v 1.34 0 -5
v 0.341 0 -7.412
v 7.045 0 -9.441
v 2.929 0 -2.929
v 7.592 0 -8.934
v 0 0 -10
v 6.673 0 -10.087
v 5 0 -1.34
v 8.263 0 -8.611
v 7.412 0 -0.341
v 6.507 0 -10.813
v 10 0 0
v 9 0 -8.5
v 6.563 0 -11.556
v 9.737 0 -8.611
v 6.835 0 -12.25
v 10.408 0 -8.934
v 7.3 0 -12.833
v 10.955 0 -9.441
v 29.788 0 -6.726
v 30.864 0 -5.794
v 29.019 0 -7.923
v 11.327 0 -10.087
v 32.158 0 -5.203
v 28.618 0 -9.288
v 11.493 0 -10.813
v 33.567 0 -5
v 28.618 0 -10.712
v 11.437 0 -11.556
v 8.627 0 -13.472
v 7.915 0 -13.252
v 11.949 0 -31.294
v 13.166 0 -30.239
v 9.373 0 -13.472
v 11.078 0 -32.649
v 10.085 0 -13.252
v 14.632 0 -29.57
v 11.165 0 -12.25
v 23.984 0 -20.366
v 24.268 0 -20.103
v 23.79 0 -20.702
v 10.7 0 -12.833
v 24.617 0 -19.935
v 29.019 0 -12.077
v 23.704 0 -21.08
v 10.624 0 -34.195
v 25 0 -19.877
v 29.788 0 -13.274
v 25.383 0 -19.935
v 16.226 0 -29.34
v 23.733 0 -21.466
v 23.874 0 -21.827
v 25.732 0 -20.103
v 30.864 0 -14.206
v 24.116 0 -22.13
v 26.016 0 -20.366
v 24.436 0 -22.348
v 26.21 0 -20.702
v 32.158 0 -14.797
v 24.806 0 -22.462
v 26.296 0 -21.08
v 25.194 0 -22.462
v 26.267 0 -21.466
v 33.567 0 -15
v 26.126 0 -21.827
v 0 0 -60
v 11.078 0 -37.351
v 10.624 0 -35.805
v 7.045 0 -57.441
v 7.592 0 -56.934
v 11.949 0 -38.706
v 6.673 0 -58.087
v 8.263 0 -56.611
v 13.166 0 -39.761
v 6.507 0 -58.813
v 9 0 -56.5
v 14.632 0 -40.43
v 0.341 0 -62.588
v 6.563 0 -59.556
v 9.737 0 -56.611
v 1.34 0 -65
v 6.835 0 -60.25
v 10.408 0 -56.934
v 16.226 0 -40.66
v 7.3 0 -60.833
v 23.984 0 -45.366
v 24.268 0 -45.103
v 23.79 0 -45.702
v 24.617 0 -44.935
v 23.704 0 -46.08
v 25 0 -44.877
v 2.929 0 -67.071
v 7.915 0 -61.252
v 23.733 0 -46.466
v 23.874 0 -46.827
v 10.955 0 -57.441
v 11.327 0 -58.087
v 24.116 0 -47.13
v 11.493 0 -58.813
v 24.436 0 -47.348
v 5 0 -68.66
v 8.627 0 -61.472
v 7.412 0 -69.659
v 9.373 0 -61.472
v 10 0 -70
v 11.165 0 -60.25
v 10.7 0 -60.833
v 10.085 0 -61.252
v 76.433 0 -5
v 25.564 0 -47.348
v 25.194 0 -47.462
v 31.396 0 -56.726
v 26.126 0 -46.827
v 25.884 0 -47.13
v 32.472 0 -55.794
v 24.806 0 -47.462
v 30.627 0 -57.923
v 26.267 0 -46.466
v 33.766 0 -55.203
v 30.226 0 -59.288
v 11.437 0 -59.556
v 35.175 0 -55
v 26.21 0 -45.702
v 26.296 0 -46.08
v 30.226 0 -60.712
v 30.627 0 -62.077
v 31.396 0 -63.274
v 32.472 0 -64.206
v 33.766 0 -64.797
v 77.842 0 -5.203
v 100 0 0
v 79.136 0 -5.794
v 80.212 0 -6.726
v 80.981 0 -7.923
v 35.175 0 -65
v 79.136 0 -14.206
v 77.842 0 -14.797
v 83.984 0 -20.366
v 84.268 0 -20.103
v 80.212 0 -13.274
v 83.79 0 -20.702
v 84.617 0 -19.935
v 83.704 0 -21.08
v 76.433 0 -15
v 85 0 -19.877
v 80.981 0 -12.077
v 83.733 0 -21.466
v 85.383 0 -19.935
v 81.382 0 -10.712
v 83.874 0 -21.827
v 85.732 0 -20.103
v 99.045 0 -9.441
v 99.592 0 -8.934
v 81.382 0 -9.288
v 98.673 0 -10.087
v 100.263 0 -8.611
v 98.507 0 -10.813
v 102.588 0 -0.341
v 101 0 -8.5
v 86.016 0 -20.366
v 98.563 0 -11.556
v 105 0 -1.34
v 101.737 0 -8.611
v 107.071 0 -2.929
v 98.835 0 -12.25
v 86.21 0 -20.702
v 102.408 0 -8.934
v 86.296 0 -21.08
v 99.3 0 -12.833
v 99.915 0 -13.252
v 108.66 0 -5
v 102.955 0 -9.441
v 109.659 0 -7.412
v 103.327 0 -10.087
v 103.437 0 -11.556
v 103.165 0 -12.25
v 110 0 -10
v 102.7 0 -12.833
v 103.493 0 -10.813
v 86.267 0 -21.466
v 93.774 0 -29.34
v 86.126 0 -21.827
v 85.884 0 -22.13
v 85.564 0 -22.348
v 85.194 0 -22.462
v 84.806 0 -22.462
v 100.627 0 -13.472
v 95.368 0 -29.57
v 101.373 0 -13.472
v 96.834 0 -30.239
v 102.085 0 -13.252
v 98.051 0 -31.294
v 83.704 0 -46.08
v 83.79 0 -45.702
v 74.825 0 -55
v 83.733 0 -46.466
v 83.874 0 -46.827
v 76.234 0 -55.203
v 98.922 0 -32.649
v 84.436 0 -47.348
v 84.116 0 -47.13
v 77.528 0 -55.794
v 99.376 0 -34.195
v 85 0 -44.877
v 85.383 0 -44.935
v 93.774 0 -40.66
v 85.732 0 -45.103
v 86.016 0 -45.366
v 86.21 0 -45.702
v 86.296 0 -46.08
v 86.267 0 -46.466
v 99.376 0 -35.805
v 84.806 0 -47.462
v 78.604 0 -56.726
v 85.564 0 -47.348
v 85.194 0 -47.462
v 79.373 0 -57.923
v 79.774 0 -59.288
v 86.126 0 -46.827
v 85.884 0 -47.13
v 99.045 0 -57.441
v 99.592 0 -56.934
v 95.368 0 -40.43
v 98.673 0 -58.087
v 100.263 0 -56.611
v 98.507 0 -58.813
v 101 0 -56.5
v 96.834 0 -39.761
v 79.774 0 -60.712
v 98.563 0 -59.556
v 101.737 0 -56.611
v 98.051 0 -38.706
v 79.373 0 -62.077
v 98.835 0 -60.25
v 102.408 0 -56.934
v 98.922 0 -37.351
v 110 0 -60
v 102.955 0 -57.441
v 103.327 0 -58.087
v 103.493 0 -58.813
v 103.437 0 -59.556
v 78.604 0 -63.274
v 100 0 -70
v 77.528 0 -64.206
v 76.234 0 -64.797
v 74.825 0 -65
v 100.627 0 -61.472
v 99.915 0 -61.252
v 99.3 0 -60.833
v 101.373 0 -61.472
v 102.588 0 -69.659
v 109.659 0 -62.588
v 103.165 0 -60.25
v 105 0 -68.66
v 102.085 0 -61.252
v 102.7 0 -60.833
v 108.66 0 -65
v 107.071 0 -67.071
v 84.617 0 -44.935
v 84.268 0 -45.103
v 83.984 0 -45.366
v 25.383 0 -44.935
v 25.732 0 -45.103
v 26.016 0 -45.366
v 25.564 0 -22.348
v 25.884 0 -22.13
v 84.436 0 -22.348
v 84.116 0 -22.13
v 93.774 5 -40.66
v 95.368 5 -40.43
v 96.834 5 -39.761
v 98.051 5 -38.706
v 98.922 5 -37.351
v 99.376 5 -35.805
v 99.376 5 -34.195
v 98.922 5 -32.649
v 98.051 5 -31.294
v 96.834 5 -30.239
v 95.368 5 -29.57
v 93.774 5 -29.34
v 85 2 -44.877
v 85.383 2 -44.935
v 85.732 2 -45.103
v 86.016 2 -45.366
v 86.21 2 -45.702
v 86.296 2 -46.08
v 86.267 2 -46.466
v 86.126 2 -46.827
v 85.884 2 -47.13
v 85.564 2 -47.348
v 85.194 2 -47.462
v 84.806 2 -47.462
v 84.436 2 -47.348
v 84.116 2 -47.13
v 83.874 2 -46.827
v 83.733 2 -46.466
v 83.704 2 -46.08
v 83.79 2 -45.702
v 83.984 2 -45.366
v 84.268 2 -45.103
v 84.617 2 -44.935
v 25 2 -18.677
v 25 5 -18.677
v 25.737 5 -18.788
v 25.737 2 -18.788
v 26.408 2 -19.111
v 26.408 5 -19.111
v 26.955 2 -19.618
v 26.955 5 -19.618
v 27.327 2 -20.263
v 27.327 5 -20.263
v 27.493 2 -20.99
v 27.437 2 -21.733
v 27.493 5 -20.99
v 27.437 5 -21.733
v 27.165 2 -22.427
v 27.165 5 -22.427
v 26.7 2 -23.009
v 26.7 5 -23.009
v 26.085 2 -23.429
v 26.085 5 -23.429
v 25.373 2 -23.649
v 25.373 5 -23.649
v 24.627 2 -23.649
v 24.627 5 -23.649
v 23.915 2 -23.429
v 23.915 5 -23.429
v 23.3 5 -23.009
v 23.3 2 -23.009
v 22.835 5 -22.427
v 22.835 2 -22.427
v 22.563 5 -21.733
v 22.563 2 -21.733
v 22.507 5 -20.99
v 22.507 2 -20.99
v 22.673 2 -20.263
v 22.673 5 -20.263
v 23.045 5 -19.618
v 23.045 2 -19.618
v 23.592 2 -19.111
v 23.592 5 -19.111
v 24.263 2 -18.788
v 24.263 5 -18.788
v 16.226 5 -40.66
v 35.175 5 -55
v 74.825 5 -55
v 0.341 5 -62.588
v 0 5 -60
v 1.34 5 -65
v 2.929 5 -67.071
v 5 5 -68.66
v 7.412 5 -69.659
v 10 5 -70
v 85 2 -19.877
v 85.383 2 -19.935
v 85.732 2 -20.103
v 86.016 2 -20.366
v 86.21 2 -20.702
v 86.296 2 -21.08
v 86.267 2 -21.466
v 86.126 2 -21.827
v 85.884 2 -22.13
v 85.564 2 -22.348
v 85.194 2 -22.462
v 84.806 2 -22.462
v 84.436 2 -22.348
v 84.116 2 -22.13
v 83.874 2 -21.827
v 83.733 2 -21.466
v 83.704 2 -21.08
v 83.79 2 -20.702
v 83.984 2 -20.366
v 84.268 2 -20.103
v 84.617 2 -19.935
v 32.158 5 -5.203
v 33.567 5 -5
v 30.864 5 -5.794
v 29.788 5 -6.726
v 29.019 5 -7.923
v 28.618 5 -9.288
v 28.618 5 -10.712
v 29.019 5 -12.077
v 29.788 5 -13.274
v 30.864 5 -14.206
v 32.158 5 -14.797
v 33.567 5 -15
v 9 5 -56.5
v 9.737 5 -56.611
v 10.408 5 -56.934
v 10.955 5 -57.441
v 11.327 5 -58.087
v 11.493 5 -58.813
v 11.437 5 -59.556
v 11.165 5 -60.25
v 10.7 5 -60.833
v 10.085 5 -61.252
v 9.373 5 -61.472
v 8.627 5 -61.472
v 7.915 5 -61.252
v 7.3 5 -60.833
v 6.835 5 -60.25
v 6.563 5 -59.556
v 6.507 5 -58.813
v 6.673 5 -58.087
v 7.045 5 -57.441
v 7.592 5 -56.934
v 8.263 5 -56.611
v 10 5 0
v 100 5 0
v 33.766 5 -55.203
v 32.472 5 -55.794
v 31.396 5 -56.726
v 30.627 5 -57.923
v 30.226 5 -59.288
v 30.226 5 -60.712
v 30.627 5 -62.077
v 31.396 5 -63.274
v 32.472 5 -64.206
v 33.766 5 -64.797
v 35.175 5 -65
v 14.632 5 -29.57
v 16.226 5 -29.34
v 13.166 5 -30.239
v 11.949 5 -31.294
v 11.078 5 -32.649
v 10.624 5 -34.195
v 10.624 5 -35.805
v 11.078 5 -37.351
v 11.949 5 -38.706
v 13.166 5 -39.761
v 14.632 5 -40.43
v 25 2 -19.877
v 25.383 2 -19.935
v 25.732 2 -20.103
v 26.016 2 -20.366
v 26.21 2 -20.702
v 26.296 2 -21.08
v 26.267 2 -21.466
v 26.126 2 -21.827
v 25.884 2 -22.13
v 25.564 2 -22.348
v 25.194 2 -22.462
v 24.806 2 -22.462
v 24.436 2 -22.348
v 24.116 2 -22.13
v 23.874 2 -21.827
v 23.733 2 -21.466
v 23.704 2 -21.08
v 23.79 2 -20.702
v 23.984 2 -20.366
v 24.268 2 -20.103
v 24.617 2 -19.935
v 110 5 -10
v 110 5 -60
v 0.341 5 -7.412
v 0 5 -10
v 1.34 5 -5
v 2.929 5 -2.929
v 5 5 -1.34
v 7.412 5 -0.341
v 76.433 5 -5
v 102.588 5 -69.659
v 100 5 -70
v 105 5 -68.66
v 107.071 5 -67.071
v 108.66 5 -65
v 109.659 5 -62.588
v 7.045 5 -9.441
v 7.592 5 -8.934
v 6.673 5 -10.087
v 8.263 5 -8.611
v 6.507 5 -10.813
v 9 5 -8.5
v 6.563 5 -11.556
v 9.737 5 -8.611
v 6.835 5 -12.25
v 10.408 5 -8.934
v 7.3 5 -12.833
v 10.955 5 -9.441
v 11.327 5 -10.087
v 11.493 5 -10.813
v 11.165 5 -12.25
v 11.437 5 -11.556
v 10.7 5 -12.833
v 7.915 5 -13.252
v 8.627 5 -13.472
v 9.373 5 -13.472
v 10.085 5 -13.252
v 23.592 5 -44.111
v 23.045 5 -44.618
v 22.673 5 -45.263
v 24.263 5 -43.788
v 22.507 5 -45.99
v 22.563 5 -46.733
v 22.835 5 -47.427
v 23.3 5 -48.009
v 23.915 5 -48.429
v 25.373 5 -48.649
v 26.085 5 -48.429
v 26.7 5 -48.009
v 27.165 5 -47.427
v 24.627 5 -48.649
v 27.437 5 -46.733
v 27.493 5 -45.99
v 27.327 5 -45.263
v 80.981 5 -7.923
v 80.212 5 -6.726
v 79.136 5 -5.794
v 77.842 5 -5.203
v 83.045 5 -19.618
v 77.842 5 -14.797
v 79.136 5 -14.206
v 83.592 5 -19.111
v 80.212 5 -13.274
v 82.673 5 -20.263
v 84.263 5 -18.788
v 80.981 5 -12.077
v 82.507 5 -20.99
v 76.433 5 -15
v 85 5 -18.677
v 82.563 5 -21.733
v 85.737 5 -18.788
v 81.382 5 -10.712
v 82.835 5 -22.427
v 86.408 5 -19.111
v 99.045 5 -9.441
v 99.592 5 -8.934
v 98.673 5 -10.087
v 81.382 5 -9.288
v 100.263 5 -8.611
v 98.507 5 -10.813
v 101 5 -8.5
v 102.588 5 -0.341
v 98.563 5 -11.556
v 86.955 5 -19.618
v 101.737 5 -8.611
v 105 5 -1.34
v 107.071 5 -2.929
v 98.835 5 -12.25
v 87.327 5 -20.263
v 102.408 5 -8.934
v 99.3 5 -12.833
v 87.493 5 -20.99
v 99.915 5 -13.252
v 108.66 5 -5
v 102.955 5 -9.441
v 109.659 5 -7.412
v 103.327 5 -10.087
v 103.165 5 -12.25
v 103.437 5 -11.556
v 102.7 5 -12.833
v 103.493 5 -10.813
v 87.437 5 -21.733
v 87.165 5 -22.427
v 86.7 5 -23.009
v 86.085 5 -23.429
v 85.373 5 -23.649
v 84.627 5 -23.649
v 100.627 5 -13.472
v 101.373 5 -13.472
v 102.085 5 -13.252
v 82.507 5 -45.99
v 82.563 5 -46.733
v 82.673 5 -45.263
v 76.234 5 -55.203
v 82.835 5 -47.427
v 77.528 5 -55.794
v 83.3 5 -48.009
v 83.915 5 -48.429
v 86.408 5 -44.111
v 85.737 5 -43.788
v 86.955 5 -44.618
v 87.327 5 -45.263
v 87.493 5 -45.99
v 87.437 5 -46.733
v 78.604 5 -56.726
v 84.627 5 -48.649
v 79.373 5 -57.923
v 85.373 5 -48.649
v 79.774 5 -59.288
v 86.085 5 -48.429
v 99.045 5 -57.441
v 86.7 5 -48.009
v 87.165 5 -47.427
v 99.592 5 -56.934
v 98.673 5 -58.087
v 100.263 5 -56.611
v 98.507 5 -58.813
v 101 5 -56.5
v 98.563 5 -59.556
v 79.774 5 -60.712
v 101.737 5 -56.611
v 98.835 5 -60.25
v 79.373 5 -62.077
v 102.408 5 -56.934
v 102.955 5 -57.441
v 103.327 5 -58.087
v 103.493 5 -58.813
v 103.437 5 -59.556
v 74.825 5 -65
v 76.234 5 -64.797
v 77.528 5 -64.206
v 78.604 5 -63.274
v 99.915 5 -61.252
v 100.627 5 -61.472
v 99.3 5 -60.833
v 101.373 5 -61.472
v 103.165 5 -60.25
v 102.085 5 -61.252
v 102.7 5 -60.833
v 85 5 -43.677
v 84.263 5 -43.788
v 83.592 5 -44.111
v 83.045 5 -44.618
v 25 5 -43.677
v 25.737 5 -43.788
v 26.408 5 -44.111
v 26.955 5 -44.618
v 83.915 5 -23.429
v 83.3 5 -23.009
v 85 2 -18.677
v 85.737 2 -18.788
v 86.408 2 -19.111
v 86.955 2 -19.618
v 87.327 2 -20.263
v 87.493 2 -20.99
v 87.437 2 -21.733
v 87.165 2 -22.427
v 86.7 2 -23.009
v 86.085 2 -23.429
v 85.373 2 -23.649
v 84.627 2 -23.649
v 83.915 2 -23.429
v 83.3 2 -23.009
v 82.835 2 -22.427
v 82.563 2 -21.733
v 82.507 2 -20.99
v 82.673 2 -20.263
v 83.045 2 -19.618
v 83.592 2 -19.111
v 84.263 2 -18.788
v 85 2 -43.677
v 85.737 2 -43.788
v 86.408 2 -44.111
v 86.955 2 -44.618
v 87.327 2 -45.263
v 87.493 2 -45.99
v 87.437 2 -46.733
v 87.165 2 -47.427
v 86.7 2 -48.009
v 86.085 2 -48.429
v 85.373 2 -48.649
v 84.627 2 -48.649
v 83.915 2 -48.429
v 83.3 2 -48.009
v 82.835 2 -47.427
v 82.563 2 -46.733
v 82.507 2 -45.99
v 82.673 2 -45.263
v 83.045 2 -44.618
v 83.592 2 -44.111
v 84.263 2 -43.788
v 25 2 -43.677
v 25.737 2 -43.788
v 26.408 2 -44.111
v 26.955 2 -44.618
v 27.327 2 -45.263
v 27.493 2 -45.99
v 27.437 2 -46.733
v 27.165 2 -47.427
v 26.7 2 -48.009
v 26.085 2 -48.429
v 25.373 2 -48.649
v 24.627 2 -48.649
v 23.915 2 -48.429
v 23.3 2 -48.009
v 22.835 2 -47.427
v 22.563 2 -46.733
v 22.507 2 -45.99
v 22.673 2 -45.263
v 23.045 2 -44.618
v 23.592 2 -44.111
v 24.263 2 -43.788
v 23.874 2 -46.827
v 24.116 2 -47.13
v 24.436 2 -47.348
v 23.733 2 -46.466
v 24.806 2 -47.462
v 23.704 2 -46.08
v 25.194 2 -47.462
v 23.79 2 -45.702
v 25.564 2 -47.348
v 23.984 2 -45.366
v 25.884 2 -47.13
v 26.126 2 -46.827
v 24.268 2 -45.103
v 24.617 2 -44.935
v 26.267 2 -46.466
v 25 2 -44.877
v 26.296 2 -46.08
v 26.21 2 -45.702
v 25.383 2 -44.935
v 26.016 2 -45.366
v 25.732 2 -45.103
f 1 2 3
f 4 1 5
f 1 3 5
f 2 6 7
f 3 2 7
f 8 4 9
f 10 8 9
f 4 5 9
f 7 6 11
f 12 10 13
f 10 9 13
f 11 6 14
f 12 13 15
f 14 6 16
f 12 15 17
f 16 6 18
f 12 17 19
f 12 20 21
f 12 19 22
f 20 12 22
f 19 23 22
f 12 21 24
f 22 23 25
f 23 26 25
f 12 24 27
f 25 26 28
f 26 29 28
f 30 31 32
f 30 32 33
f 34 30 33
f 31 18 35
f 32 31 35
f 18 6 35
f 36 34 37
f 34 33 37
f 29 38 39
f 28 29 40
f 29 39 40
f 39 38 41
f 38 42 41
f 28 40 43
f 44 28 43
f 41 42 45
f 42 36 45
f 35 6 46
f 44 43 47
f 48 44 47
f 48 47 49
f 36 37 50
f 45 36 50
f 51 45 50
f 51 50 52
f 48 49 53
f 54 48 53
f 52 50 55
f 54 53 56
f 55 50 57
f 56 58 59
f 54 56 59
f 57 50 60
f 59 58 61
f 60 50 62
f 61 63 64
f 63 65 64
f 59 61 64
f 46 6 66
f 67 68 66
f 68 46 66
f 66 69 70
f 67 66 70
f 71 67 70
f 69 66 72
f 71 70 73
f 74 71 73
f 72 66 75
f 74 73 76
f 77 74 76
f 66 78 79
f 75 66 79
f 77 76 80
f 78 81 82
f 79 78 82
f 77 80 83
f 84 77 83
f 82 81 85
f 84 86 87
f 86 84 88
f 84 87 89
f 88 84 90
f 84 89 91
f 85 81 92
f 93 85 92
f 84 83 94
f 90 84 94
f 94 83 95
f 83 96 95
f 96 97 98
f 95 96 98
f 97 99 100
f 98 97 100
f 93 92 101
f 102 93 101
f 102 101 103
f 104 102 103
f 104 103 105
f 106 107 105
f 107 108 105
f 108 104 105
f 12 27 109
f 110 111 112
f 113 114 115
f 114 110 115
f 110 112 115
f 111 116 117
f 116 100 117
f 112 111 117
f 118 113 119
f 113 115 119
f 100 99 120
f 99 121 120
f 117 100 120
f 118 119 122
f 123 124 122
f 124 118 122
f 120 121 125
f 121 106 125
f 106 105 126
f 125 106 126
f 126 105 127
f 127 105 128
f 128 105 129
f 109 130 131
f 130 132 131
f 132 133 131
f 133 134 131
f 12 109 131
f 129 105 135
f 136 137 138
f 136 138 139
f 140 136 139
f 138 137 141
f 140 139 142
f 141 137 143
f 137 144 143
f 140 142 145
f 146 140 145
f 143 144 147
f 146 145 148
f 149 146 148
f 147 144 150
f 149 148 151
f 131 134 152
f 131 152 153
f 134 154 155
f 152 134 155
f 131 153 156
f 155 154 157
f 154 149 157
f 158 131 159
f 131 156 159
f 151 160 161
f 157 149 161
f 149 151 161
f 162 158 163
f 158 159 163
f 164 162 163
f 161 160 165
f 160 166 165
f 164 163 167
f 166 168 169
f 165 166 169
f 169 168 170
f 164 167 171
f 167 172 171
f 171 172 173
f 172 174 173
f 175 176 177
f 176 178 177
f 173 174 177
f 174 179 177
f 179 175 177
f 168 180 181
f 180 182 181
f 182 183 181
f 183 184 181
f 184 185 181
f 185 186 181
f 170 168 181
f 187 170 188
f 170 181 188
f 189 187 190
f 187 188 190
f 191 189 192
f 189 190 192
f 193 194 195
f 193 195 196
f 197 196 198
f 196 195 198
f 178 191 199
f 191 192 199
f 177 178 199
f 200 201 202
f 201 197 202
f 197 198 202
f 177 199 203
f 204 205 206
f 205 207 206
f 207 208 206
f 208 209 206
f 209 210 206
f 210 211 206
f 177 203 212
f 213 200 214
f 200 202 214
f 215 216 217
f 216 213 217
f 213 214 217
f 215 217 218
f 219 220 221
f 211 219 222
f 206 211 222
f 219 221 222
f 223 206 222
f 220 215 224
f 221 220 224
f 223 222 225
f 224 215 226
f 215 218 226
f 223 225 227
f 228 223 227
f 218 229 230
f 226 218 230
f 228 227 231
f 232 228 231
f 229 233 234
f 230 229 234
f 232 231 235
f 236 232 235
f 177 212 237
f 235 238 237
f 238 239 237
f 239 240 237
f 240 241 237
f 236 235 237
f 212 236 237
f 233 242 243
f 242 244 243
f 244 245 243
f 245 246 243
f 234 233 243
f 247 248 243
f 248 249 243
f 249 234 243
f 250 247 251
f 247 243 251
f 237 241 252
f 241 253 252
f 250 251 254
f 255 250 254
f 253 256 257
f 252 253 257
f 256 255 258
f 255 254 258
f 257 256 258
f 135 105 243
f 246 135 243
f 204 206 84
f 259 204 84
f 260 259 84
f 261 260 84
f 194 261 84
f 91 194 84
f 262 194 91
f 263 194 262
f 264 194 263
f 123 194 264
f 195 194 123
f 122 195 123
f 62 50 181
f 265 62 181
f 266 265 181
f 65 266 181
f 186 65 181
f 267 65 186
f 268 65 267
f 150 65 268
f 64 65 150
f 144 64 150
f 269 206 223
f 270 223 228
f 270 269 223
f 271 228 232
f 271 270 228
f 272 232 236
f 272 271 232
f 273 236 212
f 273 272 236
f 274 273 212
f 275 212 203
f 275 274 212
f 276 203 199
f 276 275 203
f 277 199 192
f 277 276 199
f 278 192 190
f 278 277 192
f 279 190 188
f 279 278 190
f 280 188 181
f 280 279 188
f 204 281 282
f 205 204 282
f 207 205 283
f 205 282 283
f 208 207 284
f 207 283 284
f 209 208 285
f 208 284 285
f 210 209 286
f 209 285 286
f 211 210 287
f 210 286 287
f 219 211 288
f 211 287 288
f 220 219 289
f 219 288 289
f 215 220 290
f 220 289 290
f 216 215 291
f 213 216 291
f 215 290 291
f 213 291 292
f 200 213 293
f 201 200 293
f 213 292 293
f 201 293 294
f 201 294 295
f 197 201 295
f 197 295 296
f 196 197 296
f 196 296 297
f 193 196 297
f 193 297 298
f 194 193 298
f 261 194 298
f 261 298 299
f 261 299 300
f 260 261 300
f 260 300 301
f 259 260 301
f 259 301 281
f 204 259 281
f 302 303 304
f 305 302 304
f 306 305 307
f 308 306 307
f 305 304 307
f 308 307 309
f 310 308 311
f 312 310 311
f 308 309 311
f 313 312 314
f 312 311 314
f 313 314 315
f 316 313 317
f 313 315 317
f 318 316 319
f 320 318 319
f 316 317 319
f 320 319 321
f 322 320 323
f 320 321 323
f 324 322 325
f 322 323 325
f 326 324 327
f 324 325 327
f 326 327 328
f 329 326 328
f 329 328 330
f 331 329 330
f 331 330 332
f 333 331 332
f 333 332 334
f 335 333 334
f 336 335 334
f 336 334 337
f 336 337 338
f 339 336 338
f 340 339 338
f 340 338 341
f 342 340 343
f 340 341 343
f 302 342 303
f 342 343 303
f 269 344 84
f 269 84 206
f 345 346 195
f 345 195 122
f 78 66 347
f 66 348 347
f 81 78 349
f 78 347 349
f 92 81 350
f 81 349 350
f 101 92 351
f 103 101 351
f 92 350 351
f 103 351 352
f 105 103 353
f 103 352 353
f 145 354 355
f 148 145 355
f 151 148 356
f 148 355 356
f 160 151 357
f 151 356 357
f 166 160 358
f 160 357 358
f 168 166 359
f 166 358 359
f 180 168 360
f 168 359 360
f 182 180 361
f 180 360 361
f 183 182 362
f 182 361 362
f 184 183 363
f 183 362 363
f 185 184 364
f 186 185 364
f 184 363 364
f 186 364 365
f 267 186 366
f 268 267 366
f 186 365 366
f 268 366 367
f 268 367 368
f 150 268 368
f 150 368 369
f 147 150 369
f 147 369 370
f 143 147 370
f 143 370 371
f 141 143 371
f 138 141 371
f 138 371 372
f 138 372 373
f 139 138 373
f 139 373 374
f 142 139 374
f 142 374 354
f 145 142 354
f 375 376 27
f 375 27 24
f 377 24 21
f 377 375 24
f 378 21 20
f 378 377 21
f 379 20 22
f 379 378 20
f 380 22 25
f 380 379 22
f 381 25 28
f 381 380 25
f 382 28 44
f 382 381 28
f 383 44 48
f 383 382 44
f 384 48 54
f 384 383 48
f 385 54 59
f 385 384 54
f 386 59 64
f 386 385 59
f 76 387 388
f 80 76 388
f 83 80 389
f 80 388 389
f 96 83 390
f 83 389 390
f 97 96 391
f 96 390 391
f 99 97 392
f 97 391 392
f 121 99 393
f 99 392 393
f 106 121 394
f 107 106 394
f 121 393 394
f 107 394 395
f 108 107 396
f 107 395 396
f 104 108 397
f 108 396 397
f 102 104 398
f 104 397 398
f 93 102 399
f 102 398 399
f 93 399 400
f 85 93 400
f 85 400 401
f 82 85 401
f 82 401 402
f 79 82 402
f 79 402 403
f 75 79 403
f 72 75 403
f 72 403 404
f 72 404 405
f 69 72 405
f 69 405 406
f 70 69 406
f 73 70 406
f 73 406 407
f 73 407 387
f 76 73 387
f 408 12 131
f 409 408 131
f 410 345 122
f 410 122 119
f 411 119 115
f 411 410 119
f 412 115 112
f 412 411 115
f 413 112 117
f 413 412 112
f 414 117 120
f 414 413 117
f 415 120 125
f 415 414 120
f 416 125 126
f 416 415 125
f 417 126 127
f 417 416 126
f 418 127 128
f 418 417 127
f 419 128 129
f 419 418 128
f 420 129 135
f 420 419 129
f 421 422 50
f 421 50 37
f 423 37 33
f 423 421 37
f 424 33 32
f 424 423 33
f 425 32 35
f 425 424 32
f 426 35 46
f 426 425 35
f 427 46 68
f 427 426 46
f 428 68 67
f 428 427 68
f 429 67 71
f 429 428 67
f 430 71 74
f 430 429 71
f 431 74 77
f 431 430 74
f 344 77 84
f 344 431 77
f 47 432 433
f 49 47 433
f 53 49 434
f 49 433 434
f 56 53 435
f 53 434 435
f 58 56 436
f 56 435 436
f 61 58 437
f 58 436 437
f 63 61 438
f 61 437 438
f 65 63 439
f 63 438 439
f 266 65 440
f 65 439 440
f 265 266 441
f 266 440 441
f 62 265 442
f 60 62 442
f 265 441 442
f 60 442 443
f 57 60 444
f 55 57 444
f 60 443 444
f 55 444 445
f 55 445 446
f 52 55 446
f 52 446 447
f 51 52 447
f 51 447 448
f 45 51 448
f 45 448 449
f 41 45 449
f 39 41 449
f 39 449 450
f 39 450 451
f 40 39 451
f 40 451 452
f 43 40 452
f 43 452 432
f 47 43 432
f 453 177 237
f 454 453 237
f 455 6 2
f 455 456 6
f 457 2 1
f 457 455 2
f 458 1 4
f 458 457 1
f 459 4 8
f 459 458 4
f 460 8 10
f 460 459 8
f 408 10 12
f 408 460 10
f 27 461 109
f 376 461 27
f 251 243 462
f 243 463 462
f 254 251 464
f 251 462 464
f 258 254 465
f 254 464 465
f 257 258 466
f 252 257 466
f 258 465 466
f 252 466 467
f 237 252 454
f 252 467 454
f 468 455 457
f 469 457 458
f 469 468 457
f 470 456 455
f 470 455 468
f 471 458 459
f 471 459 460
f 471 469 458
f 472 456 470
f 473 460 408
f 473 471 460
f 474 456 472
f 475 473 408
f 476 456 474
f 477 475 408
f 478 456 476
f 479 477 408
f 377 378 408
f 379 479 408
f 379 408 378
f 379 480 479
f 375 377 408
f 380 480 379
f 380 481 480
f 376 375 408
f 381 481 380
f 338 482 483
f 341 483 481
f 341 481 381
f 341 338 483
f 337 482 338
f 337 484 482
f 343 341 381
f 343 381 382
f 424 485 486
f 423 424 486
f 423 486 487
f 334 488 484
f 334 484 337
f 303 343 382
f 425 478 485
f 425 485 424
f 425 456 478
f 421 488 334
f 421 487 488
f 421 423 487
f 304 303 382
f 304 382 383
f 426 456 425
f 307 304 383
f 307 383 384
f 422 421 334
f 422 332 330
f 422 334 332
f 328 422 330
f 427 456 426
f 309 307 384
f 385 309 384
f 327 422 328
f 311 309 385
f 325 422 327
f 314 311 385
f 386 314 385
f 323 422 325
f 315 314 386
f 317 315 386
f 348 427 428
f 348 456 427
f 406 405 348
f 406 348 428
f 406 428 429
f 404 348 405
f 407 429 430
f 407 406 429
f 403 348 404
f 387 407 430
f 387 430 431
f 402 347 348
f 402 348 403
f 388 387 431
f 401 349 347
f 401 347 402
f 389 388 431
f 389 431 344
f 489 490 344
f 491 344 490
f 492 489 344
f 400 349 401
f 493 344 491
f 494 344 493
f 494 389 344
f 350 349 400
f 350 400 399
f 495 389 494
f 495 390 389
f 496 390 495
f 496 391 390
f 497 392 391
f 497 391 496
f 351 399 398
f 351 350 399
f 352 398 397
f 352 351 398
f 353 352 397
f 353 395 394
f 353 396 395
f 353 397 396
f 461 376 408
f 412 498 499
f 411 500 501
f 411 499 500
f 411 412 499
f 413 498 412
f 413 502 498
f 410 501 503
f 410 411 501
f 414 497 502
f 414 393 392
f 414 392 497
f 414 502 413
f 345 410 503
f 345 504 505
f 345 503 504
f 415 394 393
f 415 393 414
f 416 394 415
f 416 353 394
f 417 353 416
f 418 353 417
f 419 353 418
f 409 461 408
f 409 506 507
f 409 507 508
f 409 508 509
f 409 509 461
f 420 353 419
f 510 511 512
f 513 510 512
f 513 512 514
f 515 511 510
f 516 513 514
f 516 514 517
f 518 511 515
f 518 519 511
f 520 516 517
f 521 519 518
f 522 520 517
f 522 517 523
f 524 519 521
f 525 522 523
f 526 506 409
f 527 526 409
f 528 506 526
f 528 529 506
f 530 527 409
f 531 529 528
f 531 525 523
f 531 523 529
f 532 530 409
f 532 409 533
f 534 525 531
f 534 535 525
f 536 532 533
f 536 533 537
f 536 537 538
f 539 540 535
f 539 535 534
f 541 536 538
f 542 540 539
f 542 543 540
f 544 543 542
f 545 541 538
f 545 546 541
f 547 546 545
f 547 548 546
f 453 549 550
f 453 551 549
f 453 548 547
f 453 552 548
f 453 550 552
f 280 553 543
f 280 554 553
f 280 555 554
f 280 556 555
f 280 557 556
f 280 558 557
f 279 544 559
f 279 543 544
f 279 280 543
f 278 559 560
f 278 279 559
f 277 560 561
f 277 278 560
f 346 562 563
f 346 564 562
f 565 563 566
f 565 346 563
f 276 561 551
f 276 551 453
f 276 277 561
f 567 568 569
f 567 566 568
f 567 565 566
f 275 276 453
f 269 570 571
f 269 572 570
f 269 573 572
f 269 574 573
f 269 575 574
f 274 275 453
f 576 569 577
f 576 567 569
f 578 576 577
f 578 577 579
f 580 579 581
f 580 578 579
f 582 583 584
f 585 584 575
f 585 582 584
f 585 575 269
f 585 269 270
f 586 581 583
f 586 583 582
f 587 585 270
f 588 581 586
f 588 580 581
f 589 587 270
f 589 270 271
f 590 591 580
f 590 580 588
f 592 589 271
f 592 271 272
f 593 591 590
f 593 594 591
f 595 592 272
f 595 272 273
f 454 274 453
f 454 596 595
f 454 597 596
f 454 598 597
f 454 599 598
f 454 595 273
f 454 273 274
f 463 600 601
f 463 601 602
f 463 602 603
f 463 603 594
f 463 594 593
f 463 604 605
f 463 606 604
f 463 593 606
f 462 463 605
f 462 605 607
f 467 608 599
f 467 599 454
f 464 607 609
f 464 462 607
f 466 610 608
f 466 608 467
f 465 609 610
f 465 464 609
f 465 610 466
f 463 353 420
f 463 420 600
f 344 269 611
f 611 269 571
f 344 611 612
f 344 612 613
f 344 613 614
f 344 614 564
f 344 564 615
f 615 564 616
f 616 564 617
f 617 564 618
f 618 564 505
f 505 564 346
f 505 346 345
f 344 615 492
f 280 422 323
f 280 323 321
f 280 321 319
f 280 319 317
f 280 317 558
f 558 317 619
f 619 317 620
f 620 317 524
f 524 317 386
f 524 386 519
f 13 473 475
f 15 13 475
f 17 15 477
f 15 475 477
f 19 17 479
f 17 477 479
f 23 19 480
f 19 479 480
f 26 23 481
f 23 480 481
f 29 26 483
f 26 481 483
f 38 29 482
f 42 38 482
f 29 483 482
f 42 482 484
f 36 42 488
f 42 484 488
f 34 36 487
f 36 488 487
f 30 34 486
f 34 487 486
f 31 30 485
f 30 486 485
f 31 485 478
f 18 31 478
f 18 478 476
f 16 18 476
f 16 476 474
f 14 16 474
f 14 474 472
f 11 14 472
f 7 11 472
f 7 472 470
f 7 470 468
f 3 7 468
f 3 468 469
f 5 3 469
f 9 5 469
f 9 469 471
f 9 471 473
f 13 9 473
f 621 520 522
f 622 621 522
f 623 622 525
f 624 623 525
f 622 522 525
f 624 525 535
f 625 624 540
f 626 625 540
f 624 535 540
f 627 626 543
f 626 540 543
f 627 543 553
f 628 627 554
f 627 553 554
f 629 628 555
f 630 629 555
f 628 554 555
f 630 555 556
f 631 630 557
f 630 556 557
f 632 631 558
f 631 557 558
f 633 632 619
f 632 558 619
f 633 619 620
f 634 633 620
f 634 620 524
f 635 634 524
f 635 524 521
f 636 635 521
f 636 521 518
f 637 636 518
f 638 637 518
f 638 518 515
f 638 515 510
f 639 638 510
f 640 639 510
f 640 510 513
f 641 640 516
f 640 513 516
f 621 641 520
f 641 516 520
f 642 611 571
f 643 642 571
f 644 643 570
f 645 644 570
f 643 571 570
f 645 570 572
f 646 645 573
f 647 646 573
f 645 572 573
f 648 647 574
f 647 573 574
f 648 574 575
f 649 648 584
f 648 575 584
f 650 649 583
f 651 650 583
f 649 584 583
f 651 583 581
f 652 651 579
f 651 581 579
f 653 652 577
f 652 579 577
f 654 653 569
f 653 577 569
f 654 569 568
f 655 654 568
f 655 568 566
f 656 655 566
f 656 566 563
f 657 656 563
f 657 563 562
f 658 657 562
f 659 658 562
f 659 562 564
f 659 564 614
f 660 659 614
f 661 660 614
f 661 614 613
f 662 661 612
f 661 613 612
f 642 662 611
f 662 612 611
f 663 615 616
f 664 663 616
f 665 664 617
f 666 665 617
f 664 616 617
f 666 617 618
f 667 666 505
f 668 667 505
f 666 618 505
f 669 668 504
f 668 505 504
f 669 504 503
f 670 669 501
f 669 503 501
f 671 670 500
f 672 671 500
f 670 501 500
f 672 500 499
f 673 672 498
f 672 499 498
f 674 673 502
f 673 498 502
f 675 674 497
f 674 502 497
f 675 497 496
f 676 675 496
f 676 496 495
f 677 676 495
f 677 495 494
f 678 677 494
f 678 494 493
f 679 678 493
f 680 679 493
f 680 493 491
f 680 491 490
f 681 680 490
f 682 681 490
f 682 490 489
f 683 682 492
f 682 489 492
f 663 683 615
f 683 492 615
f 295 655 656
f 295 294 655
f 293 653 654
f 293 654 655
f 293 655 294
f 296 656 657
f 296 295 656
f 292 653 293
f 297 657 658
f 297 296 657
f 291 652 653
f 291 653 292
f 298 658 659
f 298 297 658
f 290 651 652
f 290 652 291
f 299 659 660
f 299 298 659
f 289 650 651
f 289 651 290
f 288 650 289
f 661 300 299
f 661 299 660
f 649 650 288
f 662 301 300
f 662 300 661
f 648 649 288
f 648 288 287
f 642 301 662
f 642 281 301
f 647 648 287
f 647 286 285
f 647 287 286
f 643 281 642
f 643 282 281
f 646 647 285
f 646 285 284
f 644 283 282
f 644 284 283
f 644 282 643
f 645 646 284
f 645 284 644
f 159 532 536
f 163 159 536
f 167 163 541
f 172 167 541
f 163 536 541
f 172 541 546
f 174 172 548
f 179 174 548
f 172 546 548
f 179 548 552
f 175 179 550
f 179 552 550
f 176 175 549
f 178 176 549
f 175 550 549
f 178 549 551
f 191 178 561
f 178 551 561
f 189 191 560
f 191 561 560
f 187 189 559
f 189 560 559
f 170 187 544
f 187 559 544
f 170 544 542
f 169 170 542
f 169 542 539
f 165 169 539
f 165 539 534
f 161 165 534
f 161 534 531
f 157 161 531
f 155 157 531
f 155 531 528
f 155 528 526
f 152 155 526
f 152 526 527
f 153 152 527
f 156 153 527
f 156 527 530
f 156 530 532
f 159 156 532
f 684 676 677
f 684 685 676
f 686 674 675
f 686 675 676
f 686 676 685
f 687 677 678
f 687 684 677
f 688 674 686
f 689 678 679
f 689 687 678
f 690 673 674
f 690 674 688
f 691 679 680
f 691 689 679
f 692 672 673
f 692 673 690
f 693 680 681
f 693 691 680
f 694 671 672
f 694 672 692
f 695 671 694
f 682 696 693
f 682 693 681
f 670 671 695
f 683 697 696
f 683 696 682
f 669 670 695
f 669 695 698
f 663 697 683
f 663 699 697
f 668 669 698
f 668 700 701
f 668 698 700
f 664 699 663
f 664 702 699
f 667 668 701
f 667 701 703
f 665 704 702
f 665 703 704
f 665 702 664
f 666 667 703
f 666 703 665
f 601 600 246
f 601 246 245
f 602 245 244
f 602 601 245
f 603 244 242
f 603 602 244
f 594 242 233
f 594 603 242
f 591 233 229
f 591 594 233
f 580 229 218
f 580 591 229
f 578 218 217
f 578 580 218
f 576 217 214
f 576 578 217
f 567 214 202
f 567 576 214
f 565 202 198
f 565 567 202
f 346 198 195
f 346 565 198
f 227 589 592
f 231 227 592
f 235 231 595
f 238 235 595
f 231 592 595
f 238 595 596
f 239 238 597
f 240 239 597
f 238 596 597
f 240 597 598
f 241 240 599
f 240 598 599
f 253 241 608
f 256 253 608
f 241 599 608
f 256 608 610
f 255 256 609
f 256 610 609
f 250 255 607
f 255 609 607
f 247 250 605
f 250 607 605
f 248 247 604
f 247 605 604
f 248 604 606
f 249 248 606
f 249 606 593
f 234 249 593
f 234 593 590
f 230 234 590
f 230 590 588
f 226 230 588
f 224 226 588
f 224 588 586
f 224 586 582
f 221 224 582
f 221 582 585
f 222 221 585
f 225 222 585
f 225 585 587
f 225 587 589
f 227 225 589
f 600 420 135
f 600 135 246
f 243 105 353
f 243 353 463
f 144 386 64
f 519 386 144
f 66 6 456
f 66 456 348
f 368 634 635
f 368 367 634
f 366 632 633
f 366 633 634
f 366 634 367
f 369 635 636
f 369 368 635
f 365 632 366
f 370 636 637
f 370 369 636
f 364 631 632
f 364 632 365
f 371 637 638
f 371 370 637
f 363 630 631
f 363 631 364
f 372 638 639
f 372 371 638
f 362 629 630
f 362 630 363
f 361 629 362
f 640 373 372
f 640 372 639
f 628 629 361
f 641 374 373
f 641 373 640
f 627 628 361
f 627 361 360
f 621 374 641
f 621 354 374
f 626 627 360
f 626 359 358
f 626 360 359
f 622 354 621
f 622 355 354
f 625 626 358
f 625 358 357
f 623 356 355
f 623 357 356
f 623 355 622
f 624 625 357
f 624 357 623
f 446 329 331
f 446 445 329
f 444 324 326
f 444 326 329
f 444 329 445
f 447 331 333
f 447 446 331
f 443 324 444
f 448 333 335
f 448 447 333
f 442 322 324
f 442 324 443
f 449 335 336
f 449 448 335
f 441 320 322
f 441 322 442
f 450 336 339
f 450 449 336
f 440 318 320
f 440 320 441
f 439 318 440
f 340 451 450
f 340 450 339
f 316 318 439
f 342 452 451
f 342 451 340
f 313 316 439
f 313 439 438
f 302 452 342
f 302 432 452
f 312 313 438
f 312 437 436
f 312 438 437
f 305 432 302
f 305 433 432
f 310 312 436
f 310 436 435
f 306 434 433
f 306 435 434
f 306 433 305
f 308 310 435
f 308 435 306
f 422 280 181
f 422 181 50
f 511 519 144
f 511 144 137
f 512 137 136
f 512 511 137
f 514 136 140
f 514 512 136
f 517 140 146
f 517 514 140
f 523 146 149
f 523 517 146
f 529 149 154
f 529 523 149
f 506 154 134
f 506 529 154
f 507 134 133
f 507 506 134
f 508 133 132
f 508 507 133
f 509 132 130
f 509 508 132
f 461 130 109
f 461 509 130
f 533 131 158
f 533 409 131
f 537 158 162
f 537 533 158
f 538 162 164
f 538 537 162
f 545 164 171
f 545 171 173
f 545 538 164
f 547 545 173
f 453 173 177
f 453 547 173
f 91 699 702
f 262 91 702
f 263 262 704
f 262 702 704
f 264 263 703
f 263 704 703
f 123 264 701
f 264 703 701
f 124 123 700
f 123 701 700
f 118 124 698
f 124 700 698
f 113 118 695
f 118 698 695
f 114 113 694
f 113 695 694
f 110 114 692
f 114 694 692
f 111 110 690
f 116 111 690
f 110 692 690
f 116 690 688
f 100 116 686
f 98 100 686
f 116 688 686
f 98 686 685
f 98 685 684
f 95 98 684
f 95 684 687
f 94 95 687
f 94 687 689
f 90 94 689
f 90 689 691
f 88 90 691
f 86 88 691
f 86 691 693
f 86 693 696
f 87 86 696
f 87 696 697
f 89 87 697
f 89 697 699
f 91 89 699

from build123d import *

# Parameters (mm, degrees)
ESQUISSE1_W             = 110
ESQUISSE1_H             = 70
BOSS_EXTRU_1_DEPTH      = 5
ESQUISSE2_R             = 2.5
ESQUISSE2_R_2           = 1.3
ENL_V_MAT_EXTRU_1_DEPTH = 131.479883507
ESQUISSE4_R             = 2.5
ENL_V_MAT_EXTRU_2_DEPTH = 3
ENL_V_MAT_EXTRU_3_DEPTH = 131.479883507
CONG_1_R                = 10


with BuildPart() as part:
    # Esquisse1 → Boss.-Extru.1 (new body)
    with BuildSketch(Plane(origin=(0, 0, 0), x_dir=(1, 0, 0), z_dir=(0, 1, 0))):
        with Locations((55, 35)):
            Rectangle(ESQUISSE1_W, ESQUISSE1_H)
    extrude(amount=BOSS_EXTRU_1_DEPTH)

    # Esquisse2 → Enlèv. mat.-Extru.1 (cut, through all)
    with BuildSketch(Plane(origin=(0, 5, 0), x_dir=(1, 0, 0), z_dir=(0, 1, 0))):
        with Locations(Location((9, 59, 0), (0, 0, 270))):
            Circle(ESQUISSE2_R)
        with Locations(Location((9, 11, 0), (0, 0, 270))):
            Circle(ESQUISSE2_R)
        with Locations(Location((101, 11, 0), (0, 0, 270))):
            Circle(ESQUISSE2_R)
        with Locations(Location((101, 59, 0), (0, 0, 270))):
            Circle(ESQUISSE2_R)
        with Locations(Location((25, 46.176778867, 0), (0, 0, 270))):
            Circle(ESQUISSE2_R_2)
        with Locations(Location((25, 21.176778867, 0), (0, 0, 270))):
            Circle(ESQUISSE2_R_2)
        with Locations(Location((85, 21.176778867, 0), (0, 0, 270))):
            Circle(ESQUISSE2_R_2)
        with Locations(Location((85, 46.176778867, 0), (0, 0, 270))):
            Circle(ESQUISSE2_R_2)
    extrude(amount=-ENL_V_MAT_EXTRU_1_DEPTH, mode=Mode.SUBTRACT)

    # Esquisse4 → Enlèv. mat.-Extru.2 (cut)
    with BuildSketch(Plane(origin=(0, 5, 0), x_dir=(1, 0, 0), z_dir=(0, 1, 0))):
        with Locations(Location((25, 46.176778867, 0), (0, 0, 270))):
            Circle(ESQUISSE4_R)
        with Locations(Location((25, 21.176778867, 0), (0, 0, 270))):
            Circle(ESQUISSE4_R)
        with Locations(Location((85, 21.176778867, 0), (0, 0, 270))):
            Circle(ESQUISSE4_R)
        with Locations(Location((85, 46.176778867, 0), (0, 0, 270))):
            Circle(ESQUISSE4_R)
    extrude(amount=-ENL_V_MAT_EXTRU_2_DEPTH, mode=Mode.SUBTRACT)

    # Esquisse5 → Enlèv. mat.-Extru.3 (cut, through all)
    with BuildSketch(Plane(origin=(0, 5, 0), x_dir=(1, 0, 0), z_dir=(0, 1, 0))):
        with BuildLine():
            Line((35.175146904, 65), (74.824853096, 65))
            ThreePointArc((74.824853096, 65), (79.824853096, 60), (74.824853096, 55))
            Line((74.824853096, 55), (35.175146904, 55))
            ThreePointArc((35.175146904, 55), (30.175146904, 60), (35.175146904, 65))
        make_face()
        with BuildLine():
            Line((16.226090532, 40.659734035), (93.773909468, 40.659734035))
            ThreePointArc((93.773909468, 40.659734035), (99.433643503, 35), (93.773909468, 29.340265965))
            Line((93.773909468, 29.340265965), (16.226090532, 29.340265965))
            ThreePointArc((16.226090532, 29.340265965), (10.566356497, 35), (16.226090532, 40.659734035))
        make_face()
        with BuildLine():
            Line((33.566737233, 15), (76.433262767, 15))
            ThreePointArc((76.433262767, 15), (81.433262767, 10), (76.433262767, 5))
            Line((76.433262767, 5), (33.566737233, 5))
            ThreePointArc((33.566737233, 5), (28.566737233, 10), (33.566737233, 15))
        make_face()
    extrude(amount=-ENL_V_MAT_EXTRU_3_DEPTH, mode=Mode.SUBTRACT)

    # Congé1
    cong_1_edges = [part.edges().sort_by_distance(p)[0] for p in [
        (0, 2.5, -70),
        (110, 2.5, -70),
        (110, 2.5, 0),
        (0, 2.5, 0),
    ]]
    fillet(cong_1_edges, radius=CONG_1_R)


solid = part.part
